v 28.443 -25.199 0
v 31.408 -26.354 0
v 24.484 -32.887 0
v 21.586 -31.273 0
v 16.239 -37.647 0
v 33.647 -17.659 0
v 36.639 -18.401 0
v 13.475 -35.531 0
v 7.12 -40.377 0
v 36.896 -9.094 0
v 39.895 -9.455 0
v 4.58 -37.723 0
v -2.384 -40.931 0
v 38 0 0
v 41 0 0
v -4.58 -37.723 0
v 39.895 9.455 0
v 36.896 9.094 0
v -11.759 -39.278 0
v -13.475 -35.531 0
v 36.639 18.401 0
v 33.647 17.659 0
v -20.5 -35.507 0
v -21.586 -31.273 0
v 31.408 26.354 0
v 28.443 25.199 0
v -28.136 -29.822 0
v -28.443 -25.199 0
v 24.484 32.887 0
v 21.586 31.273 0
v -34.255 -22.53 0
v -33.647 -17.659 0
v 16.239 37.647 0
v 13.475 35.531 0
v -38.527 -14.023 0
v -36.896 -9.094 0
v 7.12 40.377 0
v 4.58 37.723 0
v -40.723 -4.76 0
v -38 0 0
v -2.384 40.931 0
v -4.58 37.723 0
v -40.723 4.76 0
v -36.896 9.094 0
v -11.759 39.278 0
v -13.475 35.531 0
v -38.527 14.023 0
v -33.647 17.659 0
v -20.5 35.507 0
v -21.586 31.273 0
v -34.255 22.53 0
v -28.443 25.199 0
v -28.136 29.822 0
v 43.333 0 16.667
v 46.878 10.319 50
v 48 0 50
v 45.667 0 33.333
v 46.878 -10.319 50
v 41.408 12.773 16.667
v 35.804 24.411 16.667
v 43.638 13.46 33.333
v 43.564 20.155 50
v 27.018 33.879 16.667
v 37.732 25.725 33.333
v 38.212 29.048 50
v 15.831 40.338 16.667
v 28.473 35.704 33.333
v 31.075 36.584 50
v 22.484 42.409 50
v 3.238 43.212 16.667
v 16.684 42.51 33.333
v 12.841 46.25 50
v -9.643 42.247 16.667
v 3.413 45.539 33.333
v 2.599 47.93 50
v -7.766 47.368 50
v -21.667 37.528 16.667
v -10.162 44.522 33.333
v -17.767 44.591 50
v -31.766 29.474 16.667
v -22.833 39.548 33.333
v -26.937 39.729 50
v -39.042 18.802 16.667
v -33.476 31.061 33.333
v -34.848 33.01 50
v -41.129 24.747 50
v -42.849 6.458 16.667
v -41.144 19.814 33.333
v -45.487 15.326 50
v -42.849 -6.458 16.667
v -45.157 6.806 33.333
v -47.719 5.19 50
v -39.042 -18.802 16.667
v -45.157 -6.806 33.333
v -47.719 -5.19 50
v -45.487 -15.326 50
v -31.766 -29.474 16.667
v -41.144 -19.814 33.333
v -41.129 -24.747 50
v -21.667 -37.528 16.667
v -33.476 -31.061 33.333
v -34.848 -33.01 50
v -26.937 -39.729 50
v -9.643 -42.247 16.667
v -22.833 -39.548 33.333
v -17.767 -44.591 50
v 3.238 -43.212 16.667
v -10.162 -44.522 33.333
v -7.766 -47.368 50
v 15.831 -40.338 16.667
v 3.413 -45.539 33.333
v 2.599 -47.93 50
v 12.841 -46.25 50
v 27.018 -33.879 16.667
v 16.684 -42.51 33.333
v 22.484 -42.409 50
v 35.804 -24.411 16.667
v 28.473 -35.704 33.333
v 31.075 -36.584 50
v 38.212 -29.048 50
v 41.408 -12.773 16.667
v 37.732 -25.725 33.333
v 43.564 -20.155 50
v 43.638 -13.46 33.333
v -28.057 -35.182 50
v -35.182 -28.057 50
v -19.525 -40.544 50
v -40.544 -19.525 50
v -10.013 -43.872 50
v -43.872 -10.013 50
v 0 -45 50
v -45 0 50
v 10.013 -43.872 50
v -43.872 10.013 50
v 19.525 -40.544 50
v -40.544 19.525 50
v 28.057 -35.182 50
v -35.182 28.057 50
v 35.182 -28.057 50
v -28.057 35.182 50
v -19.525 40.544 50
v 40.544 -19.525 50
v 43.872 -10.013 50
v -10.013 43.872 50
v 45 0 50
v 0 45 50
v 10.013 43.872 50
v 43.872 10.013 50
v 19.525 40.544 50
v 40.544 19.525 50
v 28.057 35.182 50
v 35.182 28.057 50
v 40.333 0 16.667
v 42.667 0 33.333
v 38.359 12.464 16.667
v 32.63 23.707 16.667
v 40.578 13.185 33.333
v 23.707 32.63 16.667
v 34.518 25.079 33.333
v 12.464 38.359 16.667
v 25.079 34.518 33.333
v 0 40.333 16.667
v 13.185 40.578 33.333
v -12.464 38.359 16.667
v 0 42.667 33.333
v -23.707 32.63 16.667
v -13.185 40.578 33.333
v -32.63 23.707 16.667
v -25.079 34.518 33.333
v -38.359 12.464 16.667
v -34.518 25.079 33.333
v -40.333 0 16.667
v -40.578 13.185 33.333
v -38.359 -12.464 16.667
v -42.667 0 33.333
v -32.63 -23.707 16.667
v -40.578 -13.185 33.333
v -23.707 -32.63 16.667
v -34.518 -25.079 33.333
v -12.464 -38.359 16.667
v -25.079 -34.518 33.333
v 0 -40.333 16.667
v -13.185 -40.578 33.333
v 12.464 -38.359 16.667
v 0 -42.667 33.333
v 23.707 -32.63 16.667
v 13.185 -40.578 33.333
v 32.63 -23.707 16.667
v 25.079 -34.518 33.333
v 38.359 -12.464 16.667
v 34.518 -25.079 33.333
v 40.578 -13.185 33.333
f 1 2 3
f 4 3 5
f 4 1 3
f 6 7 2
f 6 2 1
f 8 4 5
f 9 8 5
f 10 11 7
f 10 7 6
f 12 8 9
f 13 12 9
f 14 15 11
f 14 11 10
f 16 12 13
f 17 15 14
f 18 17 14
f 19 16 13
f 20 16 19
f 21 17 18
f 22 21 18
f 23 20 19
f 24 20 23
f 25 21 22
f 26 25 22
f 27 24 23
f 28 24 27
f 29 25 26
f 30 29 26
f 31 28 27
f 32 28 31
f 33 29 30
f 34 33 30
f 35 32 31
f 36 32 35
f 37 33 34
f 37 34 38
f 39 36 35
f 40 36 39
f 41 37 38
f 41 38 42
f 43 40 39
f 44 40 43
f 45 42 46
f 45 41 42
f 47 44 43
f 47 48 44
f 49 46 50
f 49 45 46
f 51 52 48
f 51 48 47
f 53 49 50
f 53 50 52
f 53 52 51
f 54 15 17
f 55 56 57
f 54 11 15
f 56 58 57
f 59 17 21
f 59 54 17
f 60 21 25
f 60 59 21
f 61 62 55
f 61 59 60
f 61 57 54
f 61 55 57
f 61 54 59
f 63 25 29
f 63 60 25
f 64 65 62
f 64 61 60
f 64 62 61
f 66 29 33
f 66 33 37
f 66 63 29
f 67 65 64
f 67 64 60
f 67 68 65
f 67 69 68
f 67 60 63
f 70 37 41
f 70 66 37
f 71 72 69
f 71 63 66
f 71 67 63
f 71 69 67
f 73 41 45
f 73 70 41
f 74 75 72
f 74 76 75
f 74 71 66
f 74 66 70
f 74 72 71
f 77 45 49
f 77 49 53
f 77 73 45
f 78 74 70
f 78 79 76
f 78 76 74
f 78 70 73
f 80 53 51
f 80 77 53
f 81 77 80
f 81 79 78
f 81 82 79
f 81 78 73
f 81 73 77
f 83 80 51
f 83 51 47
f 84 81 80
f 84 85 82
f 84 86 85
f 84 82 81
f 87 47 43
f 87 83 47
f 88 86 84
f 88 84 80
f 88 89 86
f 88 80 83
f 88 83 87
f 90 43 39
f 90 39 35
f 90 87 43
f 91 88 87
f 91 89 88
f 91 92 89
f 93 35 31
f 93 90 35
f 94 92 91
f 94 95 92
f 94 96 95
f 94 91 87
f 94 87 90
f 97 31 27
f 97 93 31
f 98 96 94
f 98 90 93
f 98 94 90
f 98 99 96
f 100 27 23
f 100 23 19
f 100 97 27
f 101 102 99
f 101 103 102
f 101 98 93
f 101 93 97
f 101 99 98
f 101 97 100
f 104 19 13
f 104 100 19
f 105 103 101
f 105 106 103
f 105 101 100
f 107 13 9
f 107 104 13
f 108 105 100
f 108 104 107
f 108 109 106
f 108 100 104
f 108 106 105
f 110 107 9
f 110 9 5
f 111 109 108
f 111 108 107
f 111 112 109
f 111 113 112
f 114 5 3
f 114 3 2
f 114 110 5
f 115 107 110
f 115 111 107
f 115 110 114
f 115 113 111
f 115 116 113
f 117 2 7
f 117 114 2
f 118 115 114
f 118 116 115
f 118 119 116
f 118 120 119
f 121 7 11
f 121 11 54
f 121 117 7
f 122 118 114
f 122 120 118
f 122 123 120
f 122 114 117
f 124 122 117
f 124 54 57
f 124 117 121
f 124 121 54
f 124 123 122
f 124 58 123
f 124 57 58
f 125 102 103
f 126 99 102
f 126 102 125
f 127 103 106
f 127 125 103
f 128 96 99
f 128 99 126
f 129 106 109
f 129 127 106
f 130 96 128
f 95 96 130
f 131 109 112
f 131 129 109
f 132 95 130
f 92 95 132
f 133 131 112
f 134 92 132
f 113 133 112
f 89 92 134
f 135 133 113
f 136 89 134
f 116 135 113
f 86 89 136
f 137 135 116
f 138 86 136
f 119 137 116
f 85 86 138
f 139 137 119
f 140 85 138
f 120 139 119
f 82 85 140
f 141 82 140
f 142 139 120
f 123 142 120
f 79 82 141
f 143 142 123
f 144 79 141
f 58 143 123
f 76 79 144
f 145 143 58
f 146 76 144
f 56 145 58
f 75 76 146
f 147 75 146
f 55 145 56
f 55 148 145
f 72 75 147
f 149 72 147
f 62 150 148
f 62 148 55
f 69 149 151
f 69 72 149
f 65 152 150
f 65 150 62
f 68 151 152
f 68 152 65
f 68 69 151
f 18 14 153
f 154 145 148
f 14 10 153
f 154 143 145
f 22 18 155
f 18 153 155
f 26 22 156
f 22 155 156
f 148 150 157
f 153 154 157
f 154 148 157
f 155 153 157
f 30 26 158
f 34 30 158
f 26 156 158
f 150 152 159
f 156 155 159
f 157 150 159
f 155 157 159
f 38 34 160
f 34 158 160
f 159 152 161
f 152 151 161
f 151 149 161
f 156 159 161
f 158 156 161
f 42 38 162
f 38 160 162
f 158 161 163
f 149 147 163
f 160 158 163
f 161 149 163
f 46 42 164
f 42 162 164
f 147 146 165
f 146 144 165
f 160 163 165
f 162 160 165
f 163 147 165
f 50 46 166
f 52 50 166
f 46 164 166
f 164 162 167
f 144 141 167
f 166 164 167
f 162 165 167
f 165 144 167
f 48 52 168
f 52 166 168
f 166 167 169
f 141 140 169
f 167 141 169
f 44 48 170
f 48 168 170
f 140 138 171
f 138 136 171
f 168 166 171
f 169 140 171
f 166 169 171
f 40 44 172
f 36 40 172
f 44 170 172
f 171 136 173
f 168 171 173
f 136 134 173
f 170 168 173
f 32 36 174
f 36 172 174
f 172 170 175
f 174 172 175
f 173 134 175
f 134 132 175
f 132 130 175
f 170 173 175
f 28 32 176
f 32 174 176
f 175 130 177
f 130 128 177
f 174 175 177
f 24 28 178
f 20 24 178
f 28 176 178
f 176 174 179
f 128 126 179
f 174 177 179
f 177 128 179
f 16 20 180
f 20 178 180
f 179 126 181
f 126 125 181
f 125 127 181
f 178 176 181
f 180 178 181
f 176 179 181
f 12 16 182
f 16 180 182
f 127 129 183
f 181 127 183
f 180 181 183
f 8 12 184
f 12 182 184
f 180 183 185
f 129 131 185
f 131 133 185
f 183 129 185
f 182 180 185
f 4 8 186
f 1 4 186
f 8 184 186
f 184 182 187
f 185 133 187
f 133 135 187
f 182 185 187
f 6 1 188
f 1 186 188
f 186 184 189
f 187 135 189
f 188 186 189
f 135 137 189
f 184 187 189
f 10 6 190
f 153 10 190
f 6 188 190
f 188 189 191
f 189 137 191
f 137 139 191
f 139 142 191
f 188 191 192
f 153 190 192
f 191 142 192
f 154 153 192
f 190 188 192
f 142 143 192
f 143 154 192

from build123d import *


with BuildPart() as indvendig:
    # Cone → Cone (revolve)
    with BuildSketch(Plane.XZ):
        Polygon((0, 0), (38, 0), (45, 50), (0, 50), align=None)
    revolve(axis=Axis((0, 0, 0), (0, 0, 1)))


with BuildPart() as krus:
    # Cone001 → Cone001 (revolve)
    with BuildSketch(Plane.XZ):
        Polygon((0, 0), (41, 0), (48, 50), (0, 50), align=None)
    revolve(axis=Axis((0, 0, 0), (0, 0, 1)))

    # Cut: cut Indvendig
    add(indvendig.part, mode=Mode.SUBTRACT)


solid = krus.part
